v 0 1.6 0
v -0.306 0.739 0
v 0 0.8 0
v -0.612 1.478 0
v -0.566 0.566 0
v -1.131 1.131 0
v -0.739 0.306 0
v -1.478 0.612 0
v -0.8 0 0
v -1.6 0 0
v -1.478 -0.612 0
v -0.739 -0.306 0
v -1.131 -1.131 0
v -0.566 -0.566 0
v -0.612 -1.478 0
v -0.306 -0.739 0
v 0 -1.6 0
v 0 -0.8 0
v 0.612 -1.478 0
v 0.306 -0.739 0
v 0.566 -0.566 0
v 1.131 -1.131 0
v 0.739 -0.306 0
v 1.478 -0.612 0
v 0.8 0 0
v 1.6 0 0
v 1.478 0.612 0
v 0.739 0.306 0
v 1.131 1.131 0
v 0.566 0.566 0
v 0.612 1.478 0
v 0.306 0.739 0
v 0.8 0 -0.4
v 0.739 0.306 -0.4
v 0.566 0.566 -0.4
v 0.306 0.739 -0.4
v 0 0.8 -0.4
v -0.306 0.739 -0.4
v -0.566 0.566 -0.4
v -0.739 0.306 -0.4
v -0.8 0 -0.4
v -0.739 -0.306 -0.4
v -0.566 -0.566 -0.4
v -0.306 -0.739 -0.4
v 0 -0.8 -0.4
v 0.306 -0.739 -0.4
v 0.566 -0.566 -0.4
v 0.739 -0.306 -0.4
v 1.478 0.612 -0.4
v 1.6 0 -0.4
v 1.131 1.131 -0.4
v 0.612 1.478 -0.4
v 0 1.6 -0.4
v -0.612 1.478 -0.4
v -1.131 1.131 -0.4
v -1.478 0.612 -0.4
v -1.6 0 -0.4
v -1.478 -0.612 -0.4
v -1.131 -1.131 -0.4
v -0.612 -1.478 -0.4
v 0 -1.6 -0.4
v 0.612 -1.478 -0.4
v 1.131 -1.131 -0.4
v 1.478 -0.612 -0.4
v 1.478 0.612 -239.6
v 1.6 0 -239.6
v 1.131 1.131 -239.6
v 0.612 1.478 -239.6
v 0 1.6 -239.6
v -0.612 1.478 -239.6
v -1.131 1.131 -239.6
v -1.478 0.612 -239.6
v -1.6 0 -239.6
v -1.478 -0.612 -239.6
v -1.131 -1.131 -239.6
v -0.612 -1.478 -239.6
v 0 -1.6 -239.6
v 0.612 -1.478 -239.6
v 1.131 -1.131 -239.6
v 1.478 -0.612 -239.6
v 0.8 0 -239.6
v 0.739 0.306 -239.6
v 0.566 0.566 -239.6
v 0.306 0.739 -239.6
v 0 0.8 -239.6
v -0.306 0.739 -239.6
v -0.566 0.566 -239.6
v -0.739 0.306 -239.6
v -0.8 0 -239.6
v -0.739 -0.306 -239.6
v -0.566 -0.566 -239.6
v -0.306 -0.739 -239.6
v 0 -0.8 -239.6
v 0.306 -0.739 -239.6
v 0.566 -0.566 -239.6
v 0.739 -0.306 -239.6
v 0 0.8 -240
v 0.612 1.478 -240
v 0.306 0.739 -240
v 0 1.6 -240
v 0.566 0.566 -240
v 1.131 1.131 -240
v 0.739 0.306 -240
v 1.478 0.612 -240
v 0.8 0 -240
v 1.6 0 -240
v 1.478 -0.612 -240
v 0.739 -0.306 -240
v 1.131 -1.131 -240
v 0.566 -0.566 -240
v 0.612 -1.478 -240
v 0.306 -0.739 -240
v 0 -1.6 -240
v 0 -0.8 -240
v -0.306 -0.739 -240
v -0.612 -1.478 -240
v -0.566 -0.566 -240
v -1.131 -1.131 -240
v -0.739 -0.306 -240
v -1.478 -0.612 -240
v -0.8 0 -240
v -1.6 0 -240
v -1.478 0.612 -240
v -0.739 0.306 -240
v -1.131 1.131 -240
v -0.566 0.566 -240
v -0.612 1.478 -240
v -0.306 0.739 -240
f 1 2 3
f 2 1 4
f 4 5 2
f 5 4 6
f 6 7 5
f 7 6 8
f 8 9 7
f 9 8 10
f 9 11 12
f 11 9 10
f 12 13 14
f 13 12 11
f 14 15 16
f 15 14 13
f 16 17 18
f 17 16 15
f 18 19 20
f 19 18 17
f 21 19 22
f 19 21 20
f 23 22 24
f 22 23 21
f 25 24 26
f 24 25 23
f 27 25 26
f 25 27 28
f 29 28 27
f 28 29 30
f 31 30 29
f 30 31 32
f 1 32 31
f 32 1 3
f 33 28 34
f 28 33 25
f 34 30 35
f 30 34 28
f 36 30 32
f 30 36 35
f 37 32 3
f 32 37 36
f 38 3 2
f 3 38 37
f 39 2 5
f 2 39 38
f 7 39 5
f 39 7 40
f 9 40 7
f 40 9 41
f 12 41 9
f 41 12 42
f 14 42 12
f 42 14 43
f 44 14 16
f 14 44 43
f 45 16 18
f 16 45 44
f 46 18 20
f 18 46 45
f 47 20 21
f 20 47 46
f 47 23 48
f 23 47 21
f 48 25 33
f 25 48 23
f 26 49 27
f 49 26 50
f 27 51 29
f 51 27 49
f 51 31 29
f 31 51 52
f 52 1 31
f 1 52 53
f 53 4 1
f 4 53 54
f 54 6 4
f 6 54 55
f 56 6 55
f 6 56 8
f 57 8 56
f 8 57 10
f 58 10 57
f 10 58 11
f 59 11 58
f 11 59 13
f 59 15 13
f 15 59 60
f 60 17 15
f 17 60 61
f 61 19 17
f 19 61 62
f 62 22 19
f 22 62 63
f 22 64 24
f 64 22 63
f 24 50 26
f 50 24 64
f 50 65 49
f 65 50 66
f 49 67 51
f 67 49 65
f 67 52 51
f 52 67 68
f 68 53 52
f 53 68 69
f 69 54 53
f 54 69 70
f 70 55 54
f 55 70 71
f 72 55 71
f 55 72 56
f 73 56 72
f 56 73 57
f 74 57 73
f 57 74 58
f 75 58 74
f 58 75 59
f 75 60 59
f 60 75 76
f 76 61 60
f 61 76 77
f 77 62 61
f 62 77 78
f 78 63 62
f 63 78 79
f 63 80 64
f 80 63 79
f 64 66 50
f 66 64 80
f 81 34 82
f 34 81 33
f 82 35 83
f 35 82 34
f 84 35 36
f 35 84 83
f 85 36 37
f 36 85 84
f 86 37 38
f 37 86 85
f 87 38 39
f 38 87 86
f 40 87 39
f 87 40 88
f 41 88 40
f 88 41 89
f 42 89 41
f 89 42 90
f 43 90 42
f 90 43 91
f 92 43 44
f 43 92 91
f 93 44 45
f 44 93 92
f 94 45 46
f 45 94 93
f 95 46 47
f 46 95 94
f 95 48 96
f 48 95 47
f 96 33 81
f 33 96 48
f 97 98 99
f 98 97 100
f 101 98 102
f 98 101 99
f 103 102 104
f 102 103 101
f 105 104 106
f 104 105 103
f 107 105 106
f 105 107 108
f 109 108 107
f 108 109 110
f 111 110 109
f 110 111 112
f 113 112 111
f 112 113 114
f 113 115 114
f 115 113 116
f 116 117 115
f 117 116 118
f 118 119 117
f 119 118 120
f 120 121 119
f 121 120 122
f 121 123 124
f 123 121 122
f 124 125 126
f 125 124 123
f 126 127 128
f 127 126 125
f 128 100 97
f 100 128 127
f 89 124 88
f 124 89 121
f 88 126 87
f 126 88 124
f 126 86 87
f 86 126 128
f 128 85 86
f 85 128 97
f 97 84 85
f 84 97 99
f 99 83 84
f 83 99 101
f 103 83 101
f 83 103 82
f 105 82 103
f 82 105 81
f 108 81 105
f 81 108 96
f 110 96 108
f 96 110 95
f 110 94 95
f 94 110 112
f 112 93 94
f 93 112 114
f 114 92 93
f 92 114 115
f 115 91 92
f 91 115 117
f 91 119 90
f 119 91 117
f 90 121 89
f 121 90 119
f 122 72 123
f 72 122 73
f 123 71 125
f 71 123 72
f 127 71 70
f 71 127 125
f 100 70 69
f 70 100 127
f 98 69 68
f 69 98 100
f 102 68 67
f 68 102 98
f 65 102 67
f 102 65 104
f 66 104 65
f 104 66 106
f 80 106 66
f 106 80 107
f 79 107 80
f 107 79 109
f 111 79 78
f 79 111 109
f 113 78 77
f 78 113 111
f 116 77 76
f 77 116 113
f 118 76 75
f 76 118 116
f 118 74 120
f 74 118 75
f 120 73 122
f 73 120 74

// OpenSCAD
// file: ../p/4-4ring1.scad
use <../lib.scad>
function ldraw_lib__4_4ring1() = [
// 0 Ring  1 x 1.0
// 0 Name: 4-4ring1.dat
// 0 Author: James Jessiman
// 0 !LDRAW_ORG Primitive UPDATE 2009-01
// 0 !LICENSE Licensed under CC BY 2.0 and CC BY 4.0 : see CAreadme.txt
// 
// 0 BFC CERTIFY CCW
  [0,"BFC","CERTIFY"],
  [0,"BFC","CCW"],
// 
// 0 !HISTORY 1998-12-15 [PTadmin] Official Update 1998-10
// 0 !HISTORY 2002-04-08 [BrickCaster] Modified for BFC compliance
// 0 !HISTORY 2002-04-25 [PTadmin] Official Update 2002-02
// 0 !HISTORY 2007-06-24 [PTadmin] Header formatted for Contributor Agreement
// 0 !HISTORY 2008-07-01 [PTadmin] Official Update 2008-01
// 0 !HISTORY 2008-08-26 [cwdee] Switch polygon winding and rename
// 0 !HISTORY 2009-05-02 [PTadmin] Official Update 2009-01
// 
// 
// 4 16 -0.7654 0 1.8478 -0.3827 0 0.9239 0 0 1 0 0 2
  [4,16,-0.7654,0,1.8478,-0.3827,0,0.9239,0,0,1,0,0,2],
// 4 16 -1.4142 0 1.4142 -0.7071 0 0.7071 -0.3827 0 0.9239 -0.7654 0 1.8478
  [4,16,-1.4142,0,1.4142,-0.7071,0,0.7071,-0.3827,0,0.9239,-0.7654,0,1.8478],
// 4 16 -1.8478 0 0.7654 -0.9239 0 0.3827 -0.7071 0 0.7071 -1.4142 0 1.41420
  [4,16,-1.8478,0,0.7654,-0.9239,0,0.3827,-0.7071,0,0.7071,-1.4142,0,1.41420],
// 4 16 -2 0 0 -1 0 0 -0.9239 0 0.3827 -1.8478 0 0.7654
  [4,16,-2,0,0,-1,0,0,-0.9239,0,0.3827,-1.8478,0,0.7654],
// 4 16 -1.8478 0 -0.7654 -0.9239 0 -0.3827 -1 0 0 -2 0 0
  [4,16,-1.8478,0,-0.7654,-0.9239,0,-0.3827,-1,0,0,-2,0,0],
// 4 16 -1.4142 0 -1.4142 -0.7071 0 -0.7071 -0.9239 0 -0.3827 -1.8478 0 -0.7654
  [4,16,-1.4142,0,-1.4142,-0.7071,0,-0.7071,-0.9239,0,-0.3827,-1.8478,0,-0.7654],
// 4 16 -0.7654 0 -1.8478 -0.3827 0 -0.9239 -0.7071 0 -0.7071 -1.4142 0 -1.4142
  [4,16,-0.7654,0,-1.8478,-0.3827,0,-0.9239,-0.7071,0,-0.7071,-1.4142,0,-1.4142],
// 4 16 0 0 -2 0 0 -1 -0.3827 0 -0.9239 -0.7654 0 -1.8478
  [4,16,0,0,-2,0,0,-1,-0.3827,0,-0.9239,-0.7654,0,-1.8478],
// 4 16 0.7654 0 -1.8478 0.3827 0 -0.9239 0 0 -1 0 0 -2
  [4,16,0.7654,0,-1.8478,0.3827,0,-0.9239,0,0,-1,0,0,-2],
// 4 16 1.4142 0 -1.4142 0.7071 0 -0.7071 0.3827 0 -0.9239 0.7654 0 -1.8478
  [4,16,1.4142,0,-1.4142,0.7071,0,-0.7071,0.3827,0,-0.9239,0.7654,0,-1.8478],
// 4 16 1.8478 0 -0.7654 0.9239 0 -0.3827 0.7071 0 -0.7071 1.4142 0 -1.4142
  [4,16,1.8478,0,-0.7654,0.9239,0,-0.3827,0.7071,0,-0.7071,1.4142,0,-1.4142],
// 4 16 2 0 0 1 0 0 0.9239 0 -0.3827 1.8478 0 -0.7654
  [4,16,2,0,0,1,0,0,0.9239,0,-0.3827,1.8478,0,-0.7654],
// 4 16 1.8478 0 0.7654 0.9239 0 0.3827 1 0 0 2 0 0
  [4,16,1.8478,0,0.7654,0.9239,0,0.3827,1,0,0,2,0,0],
// 4 16 1.4142 0 1.4142 0.7071 0 0.7071 0.9239 0 0.3827 1.8478 0 0.7654
  [4,16,1.4142,0,1.4142,0.7071,0,0.7071,0.9239,0,0.3827,1.8478,0,0.7654],
// 4 16 0.7654 0 1.8478 0.3827 0 0.9239 0.7071 0 0.7071 1.4142 0 1.4142
  [4,16,0.7654,0,1.8478,0.3827,0,0.9239,0.7071,0,0.7071,1.4142,0,1.4142],
// 4 16 0 0 2 0 0 1 0.3827 0 0.9239 0.7654 0 1.8478
  [4,16,0,0,2,0,0,1,0.3827,0,0.9239,0.7654,0,1.8478],
// 0
];
module ldraw_lib__4_4ring1(step=0, col=false, unit=2/5, alt=false, line=0.2, solid=!$preview)
    makepoly(ldraw_lib__4_4ring1(), step=step, col=col, unit=unit, alt=alt, line=line, solid=solid);
ldraw_lib__4_4ring1(line=0.2);
// file: ../p/4-4edge.scad
use <../lib.scad>
function ldraw_lib__4_4edge() = [
// 0 Circle 1.0
// 0 Name: 4-4edge.dat
// 0 Author: James Jessiman
// 0 !LDRAW_ORG Primitive UPDATE 2017-01
// 0 !LICENSE Licensed under CC BY 2.0 and CC BY 4.0 : see CAreadme.txt
// 
// 0 BFC CERTIFY CCW
  [0,"BFC","CERTIFY"],
  [0,"BFC","CCW"],
// 
// 0 !HISTORY 1998-12-15 [PTadmin] Official Update 1998-10
// 0 !HISTORY 2005-12-28 [PTadmin] Official Update 2005-01
// 0 !HISTORY 2007-06-24 [PTadmin] Header formatted for Contributor Agreement
// 0 !HISTORY 2008-07-01 [PTadmin] Official Update 2008-01
// 0 !HISTORY 2017-01-15 [Steffen] BFCed
// 0 !HISTORY 2017-12-30 [PTadmin] Official Update 2017-01
// 
// 
// 2 24 1 0 0 0.9239 0 0.3827
  [2,24,1,0,0,0.9239,0,0.3827],
// 2 24 0.9239 0 0.3827 0.7071 0 0.7071
  [2,24,0.9239,0,0.3827,0.7071,0,0.7071],
// 2 24 0.7071 0 0.7071 0.3827 0 0.9239
  [2,24,0.7071,0,0.7071,0.3827,0,0.9239],
// 2 24 0.3827 0 0.9239 0 0 1
  [2,24,0.3827,0,0.9239,0,0,1],
// 2 24 0 0 1 -0.3827 0 0.9239
  [2,24,0,0,1,-0.3827,0,0.9239],
// 2 24 -0.3827 0 0.9239 -0.7071 0 0.7071
  [2,24,-0.3827,0,0.9239,-0.7071,0,0.7071],
// 2 24 -0.7071 0 0.7071 -0.9239 0 0.3827
  [2,24,-0.7071,0,0.7071,-0.9239,0,0.3827],
// 2 24 -0.9239 0 0.3827 -1 0 -0
  [2,24,-0.9239,0,0.3827,-1,0,-0],
// 2 24 -1 0 -0 -0.9239 0 -0.3827
  [2,24,-1,0,-0,-0.9239,0,-0.3827],
// 2 24 -0.9239 0 -0.3827 -0.7071 0 -0.7071
  [2,24,-0.9239,0,-0.3827,-0.7071,0,-0.7071],
// 2 24 -0.7071 0 -0.7071 -0.3827 0 -0.9239
  [2,24,-0.7071,0,-0.7071,-0.3827,0,-0.9239],
// 2 24 -0.3827 0 -0.9239 0 0 -1
  [2,24,-0.3827,0,-0.9239,0,0,-1],
// 2 24 0 0 -1 0.3827 0 -0.9239
  [2,24,0,0,-1,0.3827,0,-0.9239],
// 2 24 0.3827 0 -0.9239 0.7071 0 -0.7071
  [2,24,0.3827,0,-0.9239,0.7071,0,-0.7071],
// 2 24 0.7071 0 -0.7071 0.9239 0 -0.3827
  [2,24,0.7071,0,-0.7071,0.9239,0,-0.3827],
// 2 24 0.9239 0 -0.3827 1 0 0
  [2,24,0.9239,0,-0.3827,1,0,0],
];
module ldraw_lib__4_4edge(step=0, col=false, unit=2/5, alt=false, line=0.2, solid=!$preview)
    makepoly(ldraw_lib__4_4edge(), step=step, col=col, unit=unit, alt=alt, line=line, solid=solid);
ldraw_lib__4_4edge(line=0.2);
// file: ../p/4-4cyli.scad
use <../lib.scad>
function ldraw_lib__4_4cyli() = [
// 0 Cylinder 1.0
// 0 Name: 4-4cyli.dat
// 0 Author: James Jessiman
// 0 !LDRAW_ORG Primitive UPDATE 2005-01
// 0 !LICENSE Licensed under CC BY 2.0 and CC BY 4.0 : see CAreadme.txt
// 
// 0 BFC CERTIFY CCW
  [0,"BFC","CERTIFY"],
  [0,"BFC","CCW"],
// 
// 0 !HISTORY 1998-12-15 [PTadmin] Official Update 1998-10
// 0 !HISTORY 2002-03-23 [sbliss] Added BFC statement; merged headers from files in distributions LDraw 0.27 and Complete.
// 0 !HISTORY 2002-04-25 [PTadmin] Official Update 2002-02
// 0 !HISTORY 2004-12-14 [guyvivan] BFC CCW
// 0 !HISTORY 2005-12-28 [PTadmin] Official Update 2005-01
// 0 !HISTORY 2007-06-24 [PTadmin] Header formatted for Contributor Agreement
// 0 !HISTORY 2008-07-01 [PTadmin] Official Update 2008-01
// 
// 
// 4 16 1 1 0 0.9239 1 0.3827 0.9239 0 0.3827 1 0 0
  [4,16,1,1,0,0.9239,1,0.3827,0.9239,0,0.3827,1,0,0],
// 5 24 1 0 0 1 1 0 0.9239 0 0.3827 0.9239 0 -0.3827
  [5,24,1,0,0,1,1,0,0.9239,0,0.3827,0.9239,0,-0.3827],
// 4 16 0.9239 1 0.3827 0.7071 1 0.7071 0.7071 0 0.7071 0.9239 0 0.3827
  [4,16,0.9239,1,0.3827,0.7071,1,0.7071,0.7071,0,0.7071,0.9239,0,0.3827],
// 5 24 0.9239 0 0.3827 0.9239 1 0.3827 0.7071 0 0.7071 1 0 0
  [5,24,0.9239,0,0.3827,0.9239,1,0.3827,0.7071,0,0.7071,1,0,0],
// 4 16 0.7071 1 0.7071 0.3827 1 0.9239 0.3827 0 0.9239 0.7071 0 0.7071
  [4,16,0.7071,1,0.7071,0.3827,1,0.9239,0.3827,0,0.9239,0.7071,0,0.7071],
// 5 24 0.7071 0 0.7071 0.7071 1 0.7071 0.3827 0 0.9239 0.9239 0 0.3827
  [5,24,0.7071,0,0.7071,0.7071,1,0.7071,0.3827,0,0.9239,0.9239,0,0.3827],
// 4 16 0.3827 1 0.9239 0 1 1 0 0 1 0.3827 0 0.9239
  [4,16,0.3827,1,0.9239,0,1,1,0,0,1,0.3827,0,0.9239],
// 5 24 0.3827 0 0.9239 0.3827 1 0.9239 0 0 1 0.7071 0 0.7071
  [5,24,0.3827,0,0.9239,0.3827,1,0.9239,0,0,1,0.7071,0,0.7071],
// 4 16 0 1 1 -0.3827 1 0.9239 -0.3827 0 0.9239 0 0 1
  [4,16,0,1,1,-0.3827,1,0.9239,-0.3827,0,0.9239,0,0,1],
// 5 24 0 0 1 0 1 1 -0.3827 0 0.9239 0.3827 0 0.9239
  [5,24,0,0,1,0,1,1,-0.3827,0,0.9239,0.3827,0,0.9239],
// 4 16 -0.3827 1 0.9239 -0.7071 1 0.7071 -0.7071 0 0.7071 -0.3827 0 0.9239
  [4,16,-0.3827,1,0.9239,-0.7071,1,0.7071,-0.7071,0,0.7071,-0.3827,0,0.9239],
// 5 24 -0.3827 0 0.9239 -0.3827 1 0.9239 -0.7071 0 0.7071 0 0 1
  [5,24,-0.3827,0,0.9239,-0.3827,1,0.9239,-0.7071,0,0.7071,0,0,1],
// 4 16 -0.7071 1 0.7071 -0.9239 1 0.3827 -0.9239 0 0.3827 -0.7071 0 0.7071
  [4,16,-0.7071,1,0.7071,-0.9239,1,0.3827,-0.9239,0,0.3827,-0.7071,0,0.7071],
// 5 24 -0.7071 0 0.7071 -0.7071 1 0.7071 -0.9239 0 0.3827 -0.3827 0 0.9239
  [5,24,-0.7071,0,0.7071,-0.7071,1,0.7071,-0.9239,0,0.3827,-0.3827,0,0.9239],
// 4 16 -0.9239 1 0.3827 -1 1 0 -1 0 0 -0.9239 0 0.3827
  [4,16,-0.9239,1,0.3827,-1,1,0,-1,0,0,-0.9239,0,0.3827],
// 5 24 -0.9239 0 0.3827 -0.9239 1 0.3827 -1 0 0 -0.7071 0 0.7071
  [5,24,-0.9239,0,0.3827,-0.9239,1,0.3827,-1,0,0,-0.7071,0,0.7071],
// 4 16 -1 1 0 -0.9239 1 -0.3827 -0.9239 0 -0.3827 -1 0 0
  [4,16,-1,1,0,-0.9239,1,-0.3827,-0.9239,0,-0.3827,-1,0,0],
// 5 24 -1 0 0 -1 1 0 -0.9239 0 -0.3827 -0.9239 0 0.3827
  [5,24,-1,0,0,-1,1,0,-0.9239,0,-0.3827,-0.9239,0,0.3827],
// 4 16 -0.9239 1 -0.3827 -0.7071 1 -0.7071 -0.7071 0 -0.7071 -0.9239 0 -0.3827
  [4,16,-0.9239,1,-0.3827,-0.7071,1,-0.7071,-0.7071,0,-0.7071,-0.9239,0,-0.3827],
// 5 24 -0.9239 0 -0.3827 -0.9239 1 -0.3827 -0.7071 0 -0.7071 -1 0 0
  [5,24,-0.9239,0,-0.3827,-0.9239,1,-0.3827,-0.7071,0,-0.7071,-1,0,0],
// 4 16 -0.7071 1 -0.7071 -0.3827 1 -0.9239 -0.3827 0 -0.9239 -0.7071 0 -0.7071
  [4,16,-0.7071,1,-0.7071,-0.3827,1,-0.9239,-0.3827,0,-0.9239,-0.7071,0,-0.7071],
// 5 24 -0.7071 0 -0.7071 -0.7071 1 -0.7071 -0.3827 0 -0.9239 -0.9239 0 -0.3827
  [5,24,-0.7071,0,-0.7071,-0.7071,1,-0.7071,-0.3827,0,-0.9239,-0.9239,0,-0.3827],
// 4 16 -0.3827 1 -0.9239 0 1 -1 0 0 -1 -0.3827 0 -0.9239
  [4,16,-0.3827,1,-0.9239,0,1,-1,0,0,-1,-0.3827,0,-0.9239],
// 5 24 -0.3827 0 -0.9239 -0.3827 1 -0.9239 0 0 -1 -0.7071 0 -0.7071
  [5,24,-0.3827,0,-0.9239,-0.3827,1,-0.9239,0,0,-1,-0.7071,0,-0.7071],
// 4 16 0 1 -1 0.3827 1 -0.9239 0.3827 0 -0.9239 0 0 -1
  [4,16,0,1,-1,0.3827,1,-0.9239,0.3827,0,-0.9239,0,0,-1],
// 5 24 0 0 -1 0 1 -1 0.3827 0 -0.9239 -0.3827 0 -0.9239
  [5,24,0,0,-1,0,1,-1,0.3827,0,-0.9239,-0.3827,0,-0.9239],
// 4 16 0.3827 1 -0.9239 0.7071 1 -0.7071 0.7071 0 -0.7071 0.3827 0 -0.9239
  [4,16,0.3827,1,-0.9239,0.7071,1,-0.7071,0.7071,0,-0.7071,0.3827,0,-0.9239],
// 5 24 0.3827 0 -0.9239 0.3827 1 -0.9239 0.7071 0 -0.7071 0 0 -1
  [5,24,0.3827,0,-0.9239,0.3827,1,-0.9239,0.7071,0,-0.7071,0,0,-1],
// 4 16 0.7071 1 -0.7071 0.9239 1 -0.3827 0.9239 0 -0.3827 0.7071 0 -0.7071
  [4,16,0.7071,1,-0.7071,0.9239,1,-0.3827,0.9239,0,-0.3827,0.7071,0,-0.7071],
// 5 24 0.7071 0 -0.7071 0.7071 1 -0.7071 0.9239 0 -0.3827 0.3827 0 -0.9239
  [5,24,0.7071,0,-0.7071,0.7071,1,-0.7071,0.9239,0,-0.3827,0.3827,0,-0.9239],
// 4 16 0.9239 1 -0.3827 1 1 0 1 0 0 0.9239 0 -0.3827
  [4,16,0.9239,1,-0.3827,1,1,0,1,0,0,0.9239,0,-0.3827],
// 5 24 0.9239 0 -0.3827 0.9239 1 -0.3827 1 0 0 0.7071 0 -0.7071
  [5,24,0.9239,0,-0.3827,0.9239,1,-0.3827,1,0,0,0.7071,0,-0.7071],
// 0
];
module ldraw_lib__4_4cyli(step=0, col=false, unit=2/5, alt=false, line=0.2, solid=!$preview)
    makepoly(ldraw_lib__4_4cyli(), step=step, col=col, unit=unit, alt=alt, line=line, solid=solid);
ldraw_lib__4_4cyli(line=0.2);
// file: u9053.scad
use <../lib.scad>
use <../p/4-4cyli.scad>
use <../p/4-4edge.scad>
use <../p/4-4ring1.scad>
function ldraw_lib__u9053() = [
// 0 ~Technic Flex-System Hose End
// 0 Name: u9053.dat
// 0 Author: William Howard [WilliamH]
// 0 !LDRAW_ORG Part UPDATE 2011-02
// 0 !LICENSE Licensed under CC BY 2.0 and CC BY 4.0 : see CAreadme.txt
// 
// 0 BFC CERTIFY CCW
  [0,"BFC","CERTIFY"],
  [0,"BFC","CCW"],
// 
// 0 !HISTORY 2011-12-21 [cwdee] Reworked subparting technique
// 0 !HISTORY 2011-12-23 [PTadmin] Renamed from 76
// 0 !HISTORY 2011-12-29 [PTadmin] Official Update 2011-02
// 
// 
// 1 16 0 0 0 2 0 0 0 1 0 0 0 2 4-4ring1.dat
  [1,16,0,0,0,2,0,0,0,1,0,0,0,2, ldraw_lib__4_4ring1()],
// 1 16 0 0 0 2 0 0 0 1 0 0 0 2 4-4edge.dat
  [1,16,0,0,0,2,0,0,0,1,0,0,0,2, ldraw_lib__4_4edge()],
// 0 BFC INVERTNEXT
  [0,"BFC","INVERTNEXT"],
// 1 16 0 0 0 2 0 0 0 1 0 0 0 2 4-4cyli.dat
  [1,16,0,0,0,2,0,0,0,1,0,0,0,2, ldraw_lib__4_4cyli()],
// 1 16 0 0 0 4 0 0 0 1 0 0 0 4 4-4edge.dat
  [1,16,0,0,0,4,0,0,0,1,0,0,0,4, ldraw_lib__4_4edge()],
// 1 16 0 0 0 4 0 0 0 1 0 0 0 4 4-4cyli.dat
  [1,16,0,0,0,4,0,0,0,1,0,0,0,4, ldraw_lib__4_4cyli()],
// 0
];
module ldraw_lib__u9053(step=0, col=false, unit=2/5, alt=false, line=0.2, solid=!$preview)
    makepoly(ldraw_lib__u9053(), step=step, col=col, unit=unit, alt=alt, line=line, solid=solid);
ldraw_lib__u9053(line=0.2);
// file: 77.scad
use <../lib.scad>
use <../p/4-4cyli.scad>
function ldraw_lib__77() = [
// 0 ~Technic Flex-System Hose Segment
// 0 Name: 77.dat
// 0 Author: William Howard [WilliamH]
// 0 !LDRAW_ORG Part UPDATE 2011-02
// 0 !LICENSE Licensed under CC BY 2.0 and CC BY 4.0 : see CAreadme.txt
// 
// 0 BFC CERTIFY CCW
  [0,"BFC","CERTIFY"],
  [0,"BFC","CCW"],
// 
// 0 !HISTORY 2011-12-21 [cwdee] Reworked subparting technique
// 0 !HISTORY 2011-12-29 [PTadmin] Official Update 2011-02
// 
// 
// 1 16 0 0 0 4 0 0 0 1 0 0 0 4 4-4cyli.dat
  [1,16,0,0,0,4,0,0,0,1,0,0,0,4, ldraw_lib__4_4cyli()],
// 0 BFC INVERTNEXT
  [0,"BFC","INVERTNEXT"],
// 1 16 0 0 0 2 0 0 0 1 0 0 0 2 4-4cyli.dat
  [1,16,0,0,0,2,0,0,0,1,0,0,0,2, ldraw_lib__4_4cyli()],
// 0
];
module ldraw_lib__77(step=0, col=false, unit=2/5, alt=false, line=0.2, solid=!$preview)
    makepoly(ldraw_lib__77(), step=step, col=col, unit=unit, alt=alt, line=line, solid=solid);
ldraw_lib__77(line=0.2);
// main file
use <../lib.scad>
use <77.scad>
use <u9053.scad>
function ldraw_lib__76282() = [
// 0 Technic Flex-System Hose 30L (600LDU)
// 0 Name: 76282.dat
// 0 Author: Tim Gould [timgould]
// 0 !LDRAW_ORG Part UPDATE 2011-02
// 0 !LICENSE Licensed under CC BY 2.0 and CC BY 4.0 : see CAreadme.txt
// 
// 0 BFC CERTIFY CCW
  [0,"BFC","CERTIFY"],
  [0,"BFC","CCW"],
// 
// 0 !KEYWORDS bar, tube
// 
// 0 !HISTORY 2011-12-29 [PTadmin] Official Update 2011-02
// 
// 
// 1 16 0 0 0 1 0 0 0 1 0 0 0 1 u9053.dat
  [1,16,0,0,0,1,0,0,0,1,0,0,0,1, ldraw_lib__u9053()],
// 1 16 0 1 0 1 0 0 0 598 0 0 0 1 77.dat
  [1,16,0,1,0,1,0,0,0,598,0,0,0,1, ldraw_lib__77()],
// 1 16 0 600 0 -1 0 0 0 -1 0 0 0 1 u9053.dat
  [1,16,0,600,0,-1,0,0,0,-1,0,0,0,1, ldraw_lib__u9053()],
];
module ldraw_lib__76282(step=0, col=false, unit=2/5, alt=false, line=0.2, solid=!$preview)
    makepoly(ldraw_lib__76282(), step=step, col=col, unit=unit, alt=alt, line=line, solid=solid);
ldraw_lib__76282(line=0.2);
